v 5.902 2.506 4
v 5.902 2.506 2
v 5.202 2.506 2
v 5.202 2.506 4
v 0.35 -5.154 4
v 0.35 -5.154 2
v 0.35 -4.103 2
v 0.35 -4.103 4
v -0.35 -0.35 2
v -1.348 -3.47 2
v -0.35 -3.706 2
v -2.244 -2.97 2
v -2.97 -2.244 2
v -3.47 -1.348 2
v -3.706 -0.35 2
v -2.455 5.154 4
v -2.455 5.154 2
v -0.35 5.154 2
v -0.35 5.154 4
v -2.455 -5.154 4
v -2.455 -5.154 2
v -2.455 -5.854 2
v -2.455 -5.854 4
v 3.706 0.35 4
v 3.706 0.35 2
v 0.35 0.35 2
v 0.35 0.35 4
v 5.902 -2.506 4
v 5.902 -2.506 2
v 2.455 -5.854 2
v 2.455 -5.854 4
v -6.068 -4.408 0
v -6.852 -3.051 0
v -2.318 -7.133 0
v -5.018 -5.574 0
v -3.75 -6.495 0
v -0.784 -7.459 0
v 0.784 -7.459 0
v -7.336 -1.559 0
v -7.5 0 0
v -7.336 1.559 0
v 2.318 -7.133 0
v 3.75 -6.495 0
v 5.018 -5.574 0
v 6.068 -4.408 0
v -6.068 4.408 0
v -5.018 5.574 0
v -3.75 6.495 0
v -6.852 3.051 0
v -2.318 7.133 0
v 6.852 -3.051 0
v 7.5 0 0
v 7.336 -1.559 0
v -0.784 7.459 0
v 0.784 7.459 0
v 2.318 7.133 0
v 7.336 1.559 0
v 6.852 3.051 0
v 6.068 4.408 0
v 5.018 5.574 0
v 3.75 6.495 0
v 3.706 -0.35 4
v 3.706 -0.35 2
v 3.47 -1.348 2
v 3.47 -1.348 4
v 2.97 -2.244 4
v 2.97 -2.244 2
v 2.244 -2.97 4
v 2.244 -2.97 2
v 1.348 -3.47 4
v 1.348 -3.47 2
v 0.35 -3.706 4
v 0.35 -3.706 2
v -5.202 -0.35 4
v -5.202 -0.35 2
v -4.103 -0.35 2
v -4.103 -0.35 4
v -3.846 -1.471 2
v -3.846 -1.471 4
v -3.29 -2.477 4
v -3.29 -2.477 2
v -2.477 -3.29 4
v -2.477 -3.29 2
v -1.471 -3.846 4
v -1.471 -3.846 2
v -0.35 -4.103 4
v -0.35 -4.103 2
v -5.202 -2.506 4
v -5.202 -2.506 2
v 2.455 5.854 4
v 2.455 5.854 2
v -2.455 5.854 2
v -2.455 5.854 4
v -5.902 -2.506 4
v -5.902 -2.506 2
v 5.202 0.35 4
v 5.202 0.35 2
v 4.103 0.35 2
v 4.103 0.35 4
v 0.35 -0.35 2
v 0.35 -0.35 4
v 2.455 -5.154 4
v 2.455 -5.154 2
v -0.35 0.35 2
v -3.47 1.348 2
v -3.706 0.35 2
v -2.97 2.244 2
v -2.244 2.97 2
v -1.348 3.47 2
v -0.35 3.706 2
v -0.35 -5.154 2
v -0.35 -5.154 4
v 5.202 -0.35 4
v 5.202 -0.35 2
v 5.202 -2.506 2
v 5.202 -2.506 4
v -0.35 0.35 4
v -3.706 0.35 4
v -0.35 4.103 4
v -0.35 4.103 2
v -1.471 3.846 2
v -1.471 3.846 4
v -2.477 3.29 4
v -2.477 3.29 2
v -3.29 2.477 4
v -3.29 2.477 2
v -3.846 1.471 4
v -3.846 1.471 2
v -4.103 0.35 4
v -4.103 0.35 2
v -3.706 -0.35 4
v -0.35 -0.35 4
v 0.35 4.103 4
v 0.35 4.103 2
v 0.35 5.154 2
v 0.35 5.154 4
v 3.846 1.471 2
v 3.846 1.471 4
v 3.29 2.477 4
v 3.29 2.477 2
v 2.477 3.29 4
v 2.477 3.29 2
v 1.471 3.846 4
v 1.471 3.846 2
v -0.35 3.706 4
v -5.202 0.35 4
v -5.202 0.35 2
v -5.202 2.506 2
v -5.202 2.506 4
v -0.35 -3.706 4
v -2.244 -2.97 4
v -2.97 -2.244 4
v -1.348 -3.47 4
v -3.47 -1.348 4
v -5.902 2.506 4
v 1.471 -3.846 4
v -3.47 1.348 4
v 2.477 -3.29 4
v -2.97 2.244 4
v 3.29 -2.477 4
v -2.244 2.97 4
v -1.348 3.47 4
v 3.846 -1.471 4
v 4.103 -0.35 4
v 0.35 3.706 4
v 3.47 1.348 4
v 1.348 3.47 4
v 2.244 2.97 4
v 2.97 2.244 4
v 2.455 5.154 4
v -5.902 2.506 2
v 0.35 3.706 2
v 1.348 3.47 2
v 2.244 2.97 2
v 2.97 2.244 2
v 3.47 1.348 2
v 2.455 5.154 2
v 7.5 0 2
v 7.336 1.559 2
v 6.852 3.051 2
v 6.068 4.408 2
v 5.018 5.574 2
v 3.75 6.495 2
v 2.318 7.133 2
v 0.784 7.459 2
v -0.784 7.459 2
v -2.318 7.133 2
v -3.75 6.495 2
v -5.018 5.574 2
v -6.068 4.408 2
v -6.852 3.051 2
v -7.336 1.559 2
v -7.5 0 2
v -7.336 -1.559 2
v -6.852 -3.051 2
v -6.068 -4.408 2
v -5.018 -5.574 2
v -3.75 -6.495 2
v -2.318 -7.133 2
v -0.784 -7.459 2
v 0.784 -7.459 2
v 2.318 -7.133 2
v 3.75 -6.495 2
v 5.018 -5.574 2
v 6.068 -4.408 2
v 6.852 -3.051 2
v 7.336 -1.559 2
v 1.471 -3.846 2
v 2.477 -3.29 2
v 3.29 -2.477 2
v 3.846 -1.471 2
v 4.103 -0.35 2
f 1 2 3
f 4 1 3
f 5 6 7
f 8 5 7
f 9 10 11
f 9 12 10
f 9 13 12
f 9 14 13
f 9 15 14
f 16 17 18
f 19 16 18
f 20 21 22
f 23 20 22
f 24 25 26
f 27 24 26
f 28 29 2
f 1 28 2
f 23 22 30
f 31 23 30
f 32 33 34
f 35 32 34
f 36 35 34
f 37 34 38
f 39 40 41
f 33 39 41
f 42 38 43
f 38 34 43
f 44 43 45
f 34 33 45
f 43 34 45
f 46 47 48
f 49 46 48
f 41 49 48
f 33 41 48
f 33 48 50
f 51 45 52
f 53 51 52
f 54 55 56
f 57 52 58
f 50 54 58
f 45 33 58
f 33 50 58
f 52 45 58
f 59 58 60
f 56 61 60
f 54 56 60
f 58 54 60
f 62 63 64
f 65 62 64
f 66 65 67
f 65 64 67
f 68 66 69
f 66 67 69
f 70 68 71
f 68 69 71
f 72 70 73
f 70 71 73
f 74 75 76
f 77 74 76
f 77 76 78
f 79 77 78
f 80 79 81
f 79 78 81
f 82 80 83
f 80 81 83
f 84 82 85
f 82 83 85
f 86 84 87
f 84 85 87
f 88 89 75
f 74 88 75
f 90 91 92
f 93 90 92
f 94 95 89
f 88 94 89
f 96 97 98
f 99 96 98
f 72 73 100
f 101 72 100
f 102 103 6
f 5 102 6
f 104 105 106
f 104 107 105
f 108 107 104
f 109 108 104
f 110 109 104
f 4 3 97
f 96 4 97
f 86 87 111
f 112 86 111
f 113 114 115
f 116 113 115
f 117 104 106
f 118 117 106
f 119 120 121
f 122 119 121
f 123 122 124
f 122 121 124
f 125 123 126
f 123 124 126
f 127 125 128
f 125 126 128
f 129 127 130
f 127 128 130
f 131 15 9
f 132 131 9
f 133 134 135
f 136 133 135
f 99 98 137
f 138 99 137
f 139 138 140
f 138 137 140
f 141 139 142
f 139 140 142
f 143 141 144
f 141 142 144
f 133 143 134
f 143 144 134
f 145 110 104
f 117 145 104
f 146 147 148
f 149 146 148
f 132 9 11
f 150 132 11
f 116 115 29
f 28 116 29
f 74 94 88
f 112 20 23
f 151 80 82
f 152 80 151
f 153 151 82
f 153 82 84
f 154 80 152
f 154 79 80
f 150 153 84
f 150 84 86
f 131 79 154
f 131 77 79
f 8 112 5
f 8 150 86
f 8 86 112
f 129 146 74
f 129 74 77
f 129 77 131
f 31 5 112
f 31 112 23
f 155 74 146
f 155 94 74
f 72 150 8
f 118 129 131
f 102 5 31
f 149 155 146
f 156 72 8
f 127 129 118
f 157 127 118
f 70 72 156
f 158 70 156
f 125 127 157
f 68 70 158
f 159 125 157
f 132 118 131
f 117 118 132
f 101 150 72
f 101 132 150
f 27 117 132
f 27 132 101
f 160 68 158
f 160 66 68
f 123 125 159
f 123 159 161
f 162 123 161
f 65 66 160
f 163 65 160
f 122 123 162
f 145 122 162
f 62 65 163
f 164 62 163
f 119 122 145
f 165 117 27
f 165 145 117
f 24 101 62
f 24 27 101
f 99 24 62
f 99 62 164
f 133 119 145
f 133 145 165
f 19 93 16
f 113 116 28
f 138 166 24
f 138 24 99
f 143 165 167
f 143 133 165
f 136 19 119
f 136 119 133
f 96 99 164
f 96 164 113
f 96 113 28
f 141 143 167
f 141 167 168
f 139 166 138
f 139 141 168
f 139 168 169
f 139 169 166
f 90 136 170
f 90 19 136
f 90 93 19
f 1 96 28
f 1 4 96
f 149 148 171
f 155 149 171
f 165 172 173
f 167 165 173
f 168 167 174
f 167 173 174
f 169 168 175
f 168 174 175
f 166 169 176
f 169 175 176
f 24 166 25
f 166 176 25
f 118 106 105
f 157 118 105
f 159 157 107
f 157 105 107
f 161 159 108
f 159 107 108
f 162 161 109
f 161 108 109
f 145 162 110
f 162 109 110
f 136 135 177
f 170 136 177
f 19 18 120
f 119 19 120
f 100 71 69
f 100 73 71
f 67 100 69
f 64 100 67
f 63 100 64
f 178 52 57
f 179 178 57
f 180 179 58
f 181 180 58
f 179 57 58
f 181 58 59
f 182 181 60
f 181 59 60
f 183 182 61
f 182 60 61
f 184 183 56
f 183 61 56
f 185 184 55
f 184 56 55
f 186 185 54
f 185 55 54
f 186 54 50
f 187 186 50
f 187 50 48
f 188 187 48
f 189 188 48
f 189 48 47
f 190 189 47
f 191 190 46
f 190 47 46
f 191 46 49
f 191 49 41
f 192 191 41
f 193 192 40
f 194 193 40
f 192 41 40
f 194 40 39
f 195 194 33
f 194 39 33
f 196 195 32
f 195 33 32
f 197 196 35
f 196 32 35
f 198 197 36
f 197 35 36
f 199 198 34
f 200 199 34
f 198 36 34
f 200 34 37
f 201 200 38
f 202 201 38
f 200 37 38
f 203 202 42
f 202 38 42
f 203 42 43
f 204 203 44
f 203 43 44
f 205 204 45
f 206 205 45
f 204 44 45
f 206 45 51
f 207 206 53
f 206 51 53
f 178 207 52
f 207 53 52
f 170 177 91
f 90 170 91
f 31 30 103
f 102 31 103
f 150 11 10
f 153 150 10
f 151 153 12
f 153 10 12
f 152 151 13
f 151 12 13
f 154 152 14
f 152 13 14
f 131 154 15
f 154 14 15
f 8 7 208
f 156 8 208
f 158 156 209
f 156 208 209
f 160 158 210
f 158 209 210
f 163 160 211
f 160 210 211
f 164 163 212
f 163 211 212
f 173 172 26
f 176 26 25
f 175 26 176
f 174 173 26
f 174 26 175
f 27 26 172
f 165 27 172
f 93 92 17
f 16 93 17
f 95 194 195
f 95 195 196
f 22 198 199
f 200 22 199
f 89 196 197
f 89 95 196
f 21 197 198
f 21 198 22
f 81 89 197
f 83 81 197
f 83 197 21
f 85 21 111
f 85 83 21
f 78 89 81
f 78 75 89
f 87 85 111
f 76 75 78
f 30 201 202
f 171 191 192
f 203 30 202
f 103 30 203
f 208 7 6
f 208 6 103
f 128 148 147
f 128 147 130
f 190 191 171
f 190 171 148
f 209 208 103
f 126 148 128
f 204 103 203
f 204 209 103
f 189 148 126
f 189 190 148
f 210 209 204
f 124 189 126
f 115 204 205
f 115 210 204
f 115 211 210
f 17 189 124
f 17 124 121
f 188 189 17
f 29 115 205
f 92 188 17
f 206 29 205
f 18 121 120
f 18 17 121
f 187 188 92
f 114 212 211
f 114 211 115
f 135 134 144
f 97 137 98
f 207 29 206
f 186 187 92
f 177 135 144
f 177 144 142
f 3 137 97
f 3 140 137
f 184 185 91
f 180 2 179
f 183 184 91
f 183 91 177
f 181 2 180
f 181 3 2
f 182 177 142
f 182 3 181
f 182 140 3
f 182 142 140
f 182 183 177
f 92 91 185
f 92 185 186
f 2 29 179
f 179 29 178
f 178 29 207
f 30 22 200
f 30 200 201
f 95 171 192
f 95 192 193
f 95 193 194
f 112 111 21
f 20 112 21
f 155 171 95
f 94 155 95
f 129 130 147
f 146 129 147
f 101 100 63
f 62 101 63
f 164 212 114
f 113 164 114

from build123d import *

# Parameters (mm, degrees)
F0_R     = 7.5
F1_DEPTH = 2
F3_DEPTH = 2


with BuildPart() as f1:
    # F0 (on Top) → F1 (new body)
    with BuildSketch(Plane.XY):
        Circle(F0_R)
    extrude(amount=F1_DEPTH)

    # F2 (on face) → F3 (join)
    with BuildSketch(Plane.XY.offset(2)):
        with BuildLine():
            Line((-0.35, 5.853991), (-2.454586, 5.853991))
            Line((-2.454586, 5.853991), (-2.454586, 5.153991))
            Line((-2.454586, 5.153991), (-0.35, 5.153991))
            Line((-0.35, 5.153991), (-0.35, 4.102806))
            ThreePointArc((-0.35, 4.102806), (-2.911659, 2.911659), (-4.102806, 0.35))
            Line((-4.102806, 0.35), (-5.201799, 0.35))
            Line((-5.201799, 0.35), (-5.201799, 2.505629))
            Line((-5.201799, 2.505629), (-5.901799, 2.505629))
            Line((-5.901799, 2.505629), (-5.901799, 0))
            Line((-5.901799, 0), (-5.901799, -2.505629))
            Line((-5.901799, -2.505629), (-5.201799, -2.505629))
            Line((-5.201799, -2.505629), (-5.201799, -0.35))
            Line((-5.201799, -0.35), (-4.102806, -0.35))
            ThreePointArc((-4.102806, -0.35), (-2.911659, -2.911659), (-0.35, -4.102806))
            Line((-0.35, -4.102806), (-0.35, -5.153991))
            Line((-0.35, -5.153991), (-2.454586, -5.153991))
            Line((-2.454586, -5.153991), (-2.454586, -5.853991))
            Line((-2.454586, -5.853991), (0, -5.853991))
            Line((0, -5.853991), (2.454586, -5.853991))
            Line((2.454586, -5.853991), (2.454586, -5.153991))
            Line((2.454586, -5.153991), (0.35, -5.153991))
            Line((0.35, -5.153991), (0.35, -4.102806))
            ThreePointArc((0.35, -4.102806), (2.911659, -2.911659), (4.102806, -0.35))
            Line((4.102806, -0.35), (5.201799, -0.35))
            Line((5.201799, -0.35), (5.201799, -2.505629))
            Line((5.201799, -2.505629), (5.901799, -2.505629))
            Line((5.901799, -2.505629), (5.901799, 0))
            Line((5.901799, 0), (5.901799, 2.505629))
            Line((5.901799, 2.505629), (5.201799, 2.505629))
            Line((5.201799, 2.505629), (5.201799, 0.35))
            Line((5.201799, 0.35), (4.102806, 0.35))
            ThreePointArc((4.102806, 0.35), (2.911659, 2.911659), (0.35, 4.102806))
            Line((0.35, 4.102806), (0.35, 5.153991))
            Line((0.35, 5.153991), (2.454586, 5.153991))
            Line((2.454586, 5.153991), (2.454586, 5.853991))
            Line((2.454586, 5.853991), (0, 5.853991))
            Line((0, 5.853991), (-0.35, 5.853991))
        make_face()
        with BuildLine():
            Line((-3.70601, -0.35), (-0.35, -0.35))
            Line((-0.35, -0.35), (-0.35, -3.70601))
            ThreePointArc((-0.35, -3.70601), (-2.632205, -2.632205), (-3.70601, -0.35))
        make_face(mode=Mode.SUBTRACT)
        with BuildLine():
            Line((0.35, -3.70601), (0.35, -0.35))
            Line((0.35, -0.35), (3.70601, -0.35))
            ThreePointArc((3.70601, -0.35), (2.632205, -2.632205), (0.35, -3.70601))
        make_face(mode=Mode.SUBTRACT)
        with BuildLine():
            Line((-0.35, 3.70601), (-0.35, 0.35))
            Line((-0.35, 0.35), (-3.70601, 0.35))
            ThreePointArc((-3.70601, 0.35), (-2.632205, 2.632205), (-0.35, 3.70601))
        make_face(mode=Mode.SUBTRACT)
        with BuildLine():
            Line((3.70601, 0.35), (0.35, 0.35))
            Line((0.35, 0.35), (0.35, 3.70601))
            ThreePointArc((0.35, 3.70601), (2.632205, 2.632205), (3.70601, 0.35))
        make_face(mode=Mode.SUBTRACT)
    extrude(amount=F3_DEPTH)


solid = f1.part
